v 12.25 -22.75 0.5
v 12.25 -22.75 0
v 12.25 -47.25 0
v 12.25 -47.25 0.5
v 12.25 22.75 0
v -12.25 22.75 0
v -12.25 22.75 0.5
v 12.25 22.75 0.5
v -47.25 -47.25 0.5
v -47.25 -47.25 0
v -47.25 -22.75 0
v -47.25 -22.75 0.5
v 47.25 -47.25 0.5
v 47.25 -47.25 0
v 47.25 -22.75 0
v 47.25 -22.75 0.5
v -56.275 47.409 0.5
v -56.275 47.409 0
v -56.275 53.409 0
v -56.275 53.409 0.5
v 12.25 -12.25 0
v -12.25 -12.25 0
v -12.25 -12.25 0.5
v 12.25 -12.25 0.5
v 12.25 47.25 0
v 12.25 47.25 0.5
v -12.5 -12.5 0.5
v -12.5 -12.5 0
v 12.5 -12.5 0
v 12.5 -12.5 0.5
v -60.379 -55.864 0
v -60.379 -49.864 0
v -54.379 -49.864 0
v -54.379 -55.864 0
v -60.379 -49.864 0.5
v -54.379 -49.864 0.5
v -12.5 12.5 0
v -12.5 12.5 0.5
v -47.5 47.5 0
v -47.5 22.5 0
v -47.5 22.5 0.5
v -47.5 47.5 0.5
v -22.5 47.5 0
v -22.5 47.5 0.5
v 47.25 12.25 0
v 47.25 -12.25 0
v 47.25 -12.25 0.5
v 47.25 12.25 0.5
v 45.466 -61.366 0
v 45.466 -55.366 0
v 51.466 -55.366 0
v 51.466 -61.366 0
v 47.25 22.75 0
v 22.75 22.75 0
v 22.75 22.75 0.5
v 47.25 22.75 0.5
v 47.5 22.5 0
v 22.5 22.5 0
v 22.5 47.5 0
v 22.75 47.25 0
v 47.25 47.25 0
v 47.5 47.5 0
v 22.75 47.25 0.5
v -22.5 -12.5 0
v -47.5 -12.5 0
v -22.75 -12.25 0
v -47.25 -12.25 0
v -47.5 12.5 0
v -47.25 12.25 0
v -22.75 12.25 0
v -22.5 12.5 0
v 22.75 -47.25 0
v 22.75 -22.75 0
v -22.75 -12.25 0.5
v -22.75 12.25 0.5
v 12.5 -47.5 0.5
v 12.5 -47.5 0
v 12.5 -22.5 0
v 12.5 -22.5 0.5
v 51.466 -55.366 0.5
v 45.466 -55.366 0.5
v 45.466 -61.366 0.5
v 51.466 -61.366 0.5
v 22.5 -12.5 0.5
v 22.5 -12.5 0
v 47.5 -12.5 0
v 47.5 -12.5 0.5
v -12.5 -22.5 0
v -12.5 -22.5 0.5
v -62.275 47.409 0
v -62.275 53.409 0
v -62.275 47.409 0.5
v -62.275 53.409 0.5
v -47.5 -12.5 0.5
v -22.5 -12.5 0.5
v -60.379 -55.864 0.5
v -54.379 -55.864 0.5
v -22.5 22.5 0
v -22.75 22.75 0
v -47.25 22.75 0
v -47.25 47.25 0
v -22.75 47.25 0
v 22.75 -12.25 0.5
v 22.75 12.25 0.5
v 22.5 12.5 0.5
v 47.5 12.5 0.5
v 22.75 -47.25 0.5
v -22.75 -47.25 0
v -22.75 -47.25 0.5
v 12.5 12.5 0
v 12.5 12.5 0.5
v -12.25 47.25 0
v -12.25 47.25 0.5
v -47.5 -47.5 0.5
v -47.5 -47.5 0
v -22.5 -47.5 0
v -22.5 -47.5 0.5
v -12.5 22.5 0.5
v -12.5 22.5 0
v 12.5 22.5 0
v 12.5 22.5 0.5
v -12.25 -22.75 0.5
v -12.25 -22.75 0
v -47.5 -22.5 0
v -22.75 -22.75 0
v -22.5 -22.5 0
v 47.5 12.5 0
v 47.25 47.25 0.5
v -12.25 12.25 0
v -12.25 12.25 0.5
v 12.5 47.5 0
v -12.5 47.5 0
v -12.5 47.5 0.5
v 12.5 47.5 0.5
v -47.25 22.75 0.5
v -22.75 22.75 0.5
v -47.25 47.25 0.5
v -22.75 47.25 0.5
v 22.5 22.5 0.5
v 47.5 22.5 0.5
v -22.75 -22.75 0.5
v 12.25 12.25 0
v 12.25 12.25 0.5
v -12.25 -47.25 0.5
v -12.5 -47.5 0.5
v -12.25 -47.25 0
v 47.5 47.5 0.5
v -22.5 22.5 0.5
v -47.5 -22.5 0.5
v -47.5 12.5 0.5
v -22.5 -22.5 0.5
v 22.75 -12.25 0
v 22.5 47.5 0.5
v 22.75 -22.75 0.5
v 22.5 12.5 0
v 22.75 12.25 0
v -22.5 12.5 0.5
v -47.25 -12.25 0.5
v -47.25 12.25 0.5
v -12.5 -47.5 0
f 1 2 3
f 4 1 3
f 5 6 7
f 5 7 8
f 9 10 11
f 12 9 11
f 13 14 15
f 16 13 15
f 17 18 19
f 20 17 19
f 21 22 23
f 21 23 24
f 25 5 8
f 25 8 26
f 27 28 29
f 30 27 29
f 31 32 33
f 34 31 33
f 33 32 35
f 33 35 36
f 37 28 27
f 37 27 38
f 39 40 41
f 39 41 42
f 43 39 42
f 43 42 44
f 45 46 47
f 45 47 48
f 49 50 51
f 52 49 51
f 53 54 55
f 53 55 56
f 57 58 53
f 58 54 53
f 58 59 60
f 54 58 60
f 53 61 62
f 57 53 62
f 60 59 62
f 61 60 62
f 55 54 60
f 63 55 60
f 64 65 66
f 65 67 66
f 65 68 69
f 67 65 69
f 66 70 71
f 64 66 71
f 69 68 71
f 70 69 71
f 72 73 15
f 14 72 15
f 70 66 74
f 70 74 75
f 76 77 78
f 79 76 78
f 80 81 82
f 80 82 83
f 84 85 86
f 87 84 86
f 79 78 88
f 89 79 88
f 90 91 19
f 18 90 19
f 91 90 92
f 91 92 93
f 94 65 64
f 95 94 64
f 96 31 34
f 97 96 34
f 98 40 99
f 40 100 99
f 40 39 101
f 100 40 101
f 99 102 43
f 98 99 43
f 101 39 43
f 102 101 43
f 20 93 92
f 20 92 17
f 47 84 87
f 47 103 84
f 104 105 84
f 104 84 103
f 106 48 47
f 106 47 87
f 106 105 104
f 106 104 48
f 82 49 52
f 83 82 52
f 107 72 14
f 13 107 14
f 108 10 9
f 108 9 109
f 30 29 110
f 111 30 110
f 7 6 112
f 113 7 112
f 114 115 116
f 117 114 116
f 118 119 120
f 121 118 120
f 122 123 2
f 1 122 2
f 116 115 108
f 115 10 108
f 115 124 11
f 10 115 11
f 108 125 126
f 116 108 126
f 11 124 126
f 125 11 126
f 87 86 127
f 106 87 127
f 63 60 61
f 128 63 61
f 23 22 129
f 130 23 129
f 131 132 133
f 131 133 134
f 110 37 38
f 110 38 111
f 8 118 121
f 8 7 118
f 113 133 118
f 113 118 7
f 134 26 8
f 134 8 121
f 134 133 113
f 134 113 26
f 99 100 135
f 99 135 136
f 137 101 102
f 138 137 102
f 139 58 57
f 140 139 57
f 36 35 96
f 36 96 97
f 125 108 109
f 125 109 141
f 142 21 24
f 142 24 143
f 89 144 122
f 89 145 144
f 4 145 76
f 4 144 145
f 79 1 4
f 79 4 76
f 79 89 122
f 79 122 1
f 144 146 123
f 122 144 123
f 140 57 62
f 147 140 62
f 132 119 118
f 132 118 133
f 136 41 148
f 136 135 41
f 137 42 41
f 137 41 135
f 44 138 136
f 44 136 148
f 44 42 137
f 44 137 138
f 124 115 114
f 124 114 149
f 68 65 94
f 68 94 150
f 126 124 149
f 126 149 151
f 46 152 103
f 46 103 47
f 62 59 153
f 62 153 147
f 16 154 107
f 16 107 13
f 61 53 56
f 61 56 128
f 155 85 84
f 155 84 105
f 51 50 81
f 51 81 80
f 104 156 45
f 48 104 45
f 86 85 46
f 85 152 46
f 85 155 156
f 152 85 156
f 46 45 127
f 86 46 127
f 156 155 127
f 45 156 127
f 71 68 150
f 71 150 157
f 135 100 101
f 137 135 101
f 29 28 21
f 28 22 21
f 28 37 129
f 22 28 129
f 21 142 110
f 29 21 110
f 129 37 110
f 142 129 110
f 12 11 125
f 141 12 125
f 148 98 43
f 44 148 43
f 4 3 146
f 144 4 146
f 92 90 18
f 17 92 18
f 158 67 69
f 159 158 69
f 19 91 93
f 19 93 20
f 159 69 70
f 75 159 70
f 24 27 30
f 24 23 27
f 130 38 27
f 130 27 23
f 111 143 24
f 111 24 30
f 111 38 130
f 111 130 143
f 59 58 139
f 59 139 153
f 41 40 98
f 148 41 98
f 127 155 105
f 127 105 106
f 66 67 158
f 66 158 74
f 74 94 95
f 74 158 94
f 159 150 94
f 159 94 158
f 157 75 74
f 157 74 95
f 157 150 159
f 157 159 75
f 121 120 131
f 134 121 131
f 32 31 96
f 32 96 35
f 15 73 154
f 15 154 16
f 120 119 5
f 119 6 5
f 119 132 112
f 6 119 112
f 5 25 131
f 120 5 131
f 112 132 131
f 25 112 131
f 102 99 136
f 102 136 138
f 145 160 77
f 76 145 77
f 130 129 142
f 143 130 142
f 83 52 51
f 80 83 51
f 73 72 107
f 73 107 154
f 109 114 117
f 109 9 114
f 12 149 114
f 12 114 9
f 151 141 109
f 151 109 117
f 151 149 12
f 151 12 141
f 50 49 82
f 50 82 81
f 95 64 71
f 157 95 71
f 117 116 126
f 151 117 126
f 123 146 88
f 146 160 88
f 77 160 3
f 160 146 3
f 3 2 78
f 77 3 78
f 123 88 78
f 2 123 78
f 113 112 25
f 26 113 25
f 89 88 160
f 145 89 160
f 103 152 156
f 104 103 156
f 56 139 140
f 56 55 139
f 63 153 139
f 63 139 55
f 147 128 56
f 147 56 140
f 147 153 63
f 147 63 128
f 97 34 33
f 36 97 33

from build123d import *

# Parameters (mm, degrees)
F0_W     = 25
F0_H     = 25
F0_W_2   = 24.5
F0_H_2   = 24.5
F0_W_3   = 6
F0_H_3   = 6
F1_DEPTH = 0.5


with BuildPart() as f1:
    # F0 (on Top) → F1 (new body)
    with BuildSketch(Plane.XY):
        with Locations((-35, 0)):
            Rectangle(F0_W, F0_H)
        with Locations((-35, 0)):
            Rectangle(F0_W_2, F0_H_2, mode=Mode.SUBTRACT)
        with Locations((0, 35)):
            Rectangle(F0_W, F0_H)
        with Locations((0, 35)):
            Rectangle(F0_W_2, F0_H_2, mode=Mode.SUBTRACT)
        with Locations((-35, 35)):
            Rectangle(F0_W, F0_H)
        with Locations((-35, 35)):
            Rectangle(F0_W_2, F0_H_2, mode=Mode.SUBTRACT)
        Rectangle(F0_W, F0_H)
        Rectangle(F0_W_2, F0_H_2, mode=Mode.SUBTRACT)
        with Locations((-35, -35)):
            Rectangle(F0_W, F0_H)
        with Locations((-35, -35)):
            Rectangle(F0_W_2, F0_H_2, mode=Mode.SUBTRACT)
        Polygon((-12.25, -47.25), (-4.531539, -47.25), (12.25, -47.25), (12.25, -22.75), (-12.25, -22.75), align=None)
        with Locations((0, -35.25)):
            Rectangle(F0_W_3, F0_H_3, mode=Mode.SUBTRACT)
        Polygon((-12.5, -47.5), (-4.531539, -47.5), (12.5, -47.5), (12.5, -22.5), (-12.5, -22.5), align=None)
        Polygon((12.25, -47.25), (-4.531539, -47.25), (-12.25, -47.25), (-12.25, -22.75), (12.25, -22.75), align=None, mode=Mode.SUBTRACT)
        with Locations((35, -35)):
            Rectangle(F0_W_2, F0_H_2)
        with Locations((35, 35)):
            Rectangle(F0_W, F0_H)
        with Locations((35, 35)):
            Rectangle(F0_W_2, F0_H_2, mode=Mode.SUBTRACT)
        with Locations((35, 0)):
            Rectangle(F0_W, F0_H)
        with Locations((35, 0)):
            Rectangle(F0_W_2, F0_H_2, mode=Mode.SUBTRACT)
        with Locations((-59.274712, 50.408808)):
            Rectangle(F0_W_3, F0_H_3)
        with Locations((-57.379136, -52.863753)):
            Rectangle(F0_W_3, F0_H_3)
        with Locations((48.465514, -58.366096)):
            Rectangle(F0_W_3, F0_H_3)
    extrude(amount=F1_DEPTH)


solid = f1.part
